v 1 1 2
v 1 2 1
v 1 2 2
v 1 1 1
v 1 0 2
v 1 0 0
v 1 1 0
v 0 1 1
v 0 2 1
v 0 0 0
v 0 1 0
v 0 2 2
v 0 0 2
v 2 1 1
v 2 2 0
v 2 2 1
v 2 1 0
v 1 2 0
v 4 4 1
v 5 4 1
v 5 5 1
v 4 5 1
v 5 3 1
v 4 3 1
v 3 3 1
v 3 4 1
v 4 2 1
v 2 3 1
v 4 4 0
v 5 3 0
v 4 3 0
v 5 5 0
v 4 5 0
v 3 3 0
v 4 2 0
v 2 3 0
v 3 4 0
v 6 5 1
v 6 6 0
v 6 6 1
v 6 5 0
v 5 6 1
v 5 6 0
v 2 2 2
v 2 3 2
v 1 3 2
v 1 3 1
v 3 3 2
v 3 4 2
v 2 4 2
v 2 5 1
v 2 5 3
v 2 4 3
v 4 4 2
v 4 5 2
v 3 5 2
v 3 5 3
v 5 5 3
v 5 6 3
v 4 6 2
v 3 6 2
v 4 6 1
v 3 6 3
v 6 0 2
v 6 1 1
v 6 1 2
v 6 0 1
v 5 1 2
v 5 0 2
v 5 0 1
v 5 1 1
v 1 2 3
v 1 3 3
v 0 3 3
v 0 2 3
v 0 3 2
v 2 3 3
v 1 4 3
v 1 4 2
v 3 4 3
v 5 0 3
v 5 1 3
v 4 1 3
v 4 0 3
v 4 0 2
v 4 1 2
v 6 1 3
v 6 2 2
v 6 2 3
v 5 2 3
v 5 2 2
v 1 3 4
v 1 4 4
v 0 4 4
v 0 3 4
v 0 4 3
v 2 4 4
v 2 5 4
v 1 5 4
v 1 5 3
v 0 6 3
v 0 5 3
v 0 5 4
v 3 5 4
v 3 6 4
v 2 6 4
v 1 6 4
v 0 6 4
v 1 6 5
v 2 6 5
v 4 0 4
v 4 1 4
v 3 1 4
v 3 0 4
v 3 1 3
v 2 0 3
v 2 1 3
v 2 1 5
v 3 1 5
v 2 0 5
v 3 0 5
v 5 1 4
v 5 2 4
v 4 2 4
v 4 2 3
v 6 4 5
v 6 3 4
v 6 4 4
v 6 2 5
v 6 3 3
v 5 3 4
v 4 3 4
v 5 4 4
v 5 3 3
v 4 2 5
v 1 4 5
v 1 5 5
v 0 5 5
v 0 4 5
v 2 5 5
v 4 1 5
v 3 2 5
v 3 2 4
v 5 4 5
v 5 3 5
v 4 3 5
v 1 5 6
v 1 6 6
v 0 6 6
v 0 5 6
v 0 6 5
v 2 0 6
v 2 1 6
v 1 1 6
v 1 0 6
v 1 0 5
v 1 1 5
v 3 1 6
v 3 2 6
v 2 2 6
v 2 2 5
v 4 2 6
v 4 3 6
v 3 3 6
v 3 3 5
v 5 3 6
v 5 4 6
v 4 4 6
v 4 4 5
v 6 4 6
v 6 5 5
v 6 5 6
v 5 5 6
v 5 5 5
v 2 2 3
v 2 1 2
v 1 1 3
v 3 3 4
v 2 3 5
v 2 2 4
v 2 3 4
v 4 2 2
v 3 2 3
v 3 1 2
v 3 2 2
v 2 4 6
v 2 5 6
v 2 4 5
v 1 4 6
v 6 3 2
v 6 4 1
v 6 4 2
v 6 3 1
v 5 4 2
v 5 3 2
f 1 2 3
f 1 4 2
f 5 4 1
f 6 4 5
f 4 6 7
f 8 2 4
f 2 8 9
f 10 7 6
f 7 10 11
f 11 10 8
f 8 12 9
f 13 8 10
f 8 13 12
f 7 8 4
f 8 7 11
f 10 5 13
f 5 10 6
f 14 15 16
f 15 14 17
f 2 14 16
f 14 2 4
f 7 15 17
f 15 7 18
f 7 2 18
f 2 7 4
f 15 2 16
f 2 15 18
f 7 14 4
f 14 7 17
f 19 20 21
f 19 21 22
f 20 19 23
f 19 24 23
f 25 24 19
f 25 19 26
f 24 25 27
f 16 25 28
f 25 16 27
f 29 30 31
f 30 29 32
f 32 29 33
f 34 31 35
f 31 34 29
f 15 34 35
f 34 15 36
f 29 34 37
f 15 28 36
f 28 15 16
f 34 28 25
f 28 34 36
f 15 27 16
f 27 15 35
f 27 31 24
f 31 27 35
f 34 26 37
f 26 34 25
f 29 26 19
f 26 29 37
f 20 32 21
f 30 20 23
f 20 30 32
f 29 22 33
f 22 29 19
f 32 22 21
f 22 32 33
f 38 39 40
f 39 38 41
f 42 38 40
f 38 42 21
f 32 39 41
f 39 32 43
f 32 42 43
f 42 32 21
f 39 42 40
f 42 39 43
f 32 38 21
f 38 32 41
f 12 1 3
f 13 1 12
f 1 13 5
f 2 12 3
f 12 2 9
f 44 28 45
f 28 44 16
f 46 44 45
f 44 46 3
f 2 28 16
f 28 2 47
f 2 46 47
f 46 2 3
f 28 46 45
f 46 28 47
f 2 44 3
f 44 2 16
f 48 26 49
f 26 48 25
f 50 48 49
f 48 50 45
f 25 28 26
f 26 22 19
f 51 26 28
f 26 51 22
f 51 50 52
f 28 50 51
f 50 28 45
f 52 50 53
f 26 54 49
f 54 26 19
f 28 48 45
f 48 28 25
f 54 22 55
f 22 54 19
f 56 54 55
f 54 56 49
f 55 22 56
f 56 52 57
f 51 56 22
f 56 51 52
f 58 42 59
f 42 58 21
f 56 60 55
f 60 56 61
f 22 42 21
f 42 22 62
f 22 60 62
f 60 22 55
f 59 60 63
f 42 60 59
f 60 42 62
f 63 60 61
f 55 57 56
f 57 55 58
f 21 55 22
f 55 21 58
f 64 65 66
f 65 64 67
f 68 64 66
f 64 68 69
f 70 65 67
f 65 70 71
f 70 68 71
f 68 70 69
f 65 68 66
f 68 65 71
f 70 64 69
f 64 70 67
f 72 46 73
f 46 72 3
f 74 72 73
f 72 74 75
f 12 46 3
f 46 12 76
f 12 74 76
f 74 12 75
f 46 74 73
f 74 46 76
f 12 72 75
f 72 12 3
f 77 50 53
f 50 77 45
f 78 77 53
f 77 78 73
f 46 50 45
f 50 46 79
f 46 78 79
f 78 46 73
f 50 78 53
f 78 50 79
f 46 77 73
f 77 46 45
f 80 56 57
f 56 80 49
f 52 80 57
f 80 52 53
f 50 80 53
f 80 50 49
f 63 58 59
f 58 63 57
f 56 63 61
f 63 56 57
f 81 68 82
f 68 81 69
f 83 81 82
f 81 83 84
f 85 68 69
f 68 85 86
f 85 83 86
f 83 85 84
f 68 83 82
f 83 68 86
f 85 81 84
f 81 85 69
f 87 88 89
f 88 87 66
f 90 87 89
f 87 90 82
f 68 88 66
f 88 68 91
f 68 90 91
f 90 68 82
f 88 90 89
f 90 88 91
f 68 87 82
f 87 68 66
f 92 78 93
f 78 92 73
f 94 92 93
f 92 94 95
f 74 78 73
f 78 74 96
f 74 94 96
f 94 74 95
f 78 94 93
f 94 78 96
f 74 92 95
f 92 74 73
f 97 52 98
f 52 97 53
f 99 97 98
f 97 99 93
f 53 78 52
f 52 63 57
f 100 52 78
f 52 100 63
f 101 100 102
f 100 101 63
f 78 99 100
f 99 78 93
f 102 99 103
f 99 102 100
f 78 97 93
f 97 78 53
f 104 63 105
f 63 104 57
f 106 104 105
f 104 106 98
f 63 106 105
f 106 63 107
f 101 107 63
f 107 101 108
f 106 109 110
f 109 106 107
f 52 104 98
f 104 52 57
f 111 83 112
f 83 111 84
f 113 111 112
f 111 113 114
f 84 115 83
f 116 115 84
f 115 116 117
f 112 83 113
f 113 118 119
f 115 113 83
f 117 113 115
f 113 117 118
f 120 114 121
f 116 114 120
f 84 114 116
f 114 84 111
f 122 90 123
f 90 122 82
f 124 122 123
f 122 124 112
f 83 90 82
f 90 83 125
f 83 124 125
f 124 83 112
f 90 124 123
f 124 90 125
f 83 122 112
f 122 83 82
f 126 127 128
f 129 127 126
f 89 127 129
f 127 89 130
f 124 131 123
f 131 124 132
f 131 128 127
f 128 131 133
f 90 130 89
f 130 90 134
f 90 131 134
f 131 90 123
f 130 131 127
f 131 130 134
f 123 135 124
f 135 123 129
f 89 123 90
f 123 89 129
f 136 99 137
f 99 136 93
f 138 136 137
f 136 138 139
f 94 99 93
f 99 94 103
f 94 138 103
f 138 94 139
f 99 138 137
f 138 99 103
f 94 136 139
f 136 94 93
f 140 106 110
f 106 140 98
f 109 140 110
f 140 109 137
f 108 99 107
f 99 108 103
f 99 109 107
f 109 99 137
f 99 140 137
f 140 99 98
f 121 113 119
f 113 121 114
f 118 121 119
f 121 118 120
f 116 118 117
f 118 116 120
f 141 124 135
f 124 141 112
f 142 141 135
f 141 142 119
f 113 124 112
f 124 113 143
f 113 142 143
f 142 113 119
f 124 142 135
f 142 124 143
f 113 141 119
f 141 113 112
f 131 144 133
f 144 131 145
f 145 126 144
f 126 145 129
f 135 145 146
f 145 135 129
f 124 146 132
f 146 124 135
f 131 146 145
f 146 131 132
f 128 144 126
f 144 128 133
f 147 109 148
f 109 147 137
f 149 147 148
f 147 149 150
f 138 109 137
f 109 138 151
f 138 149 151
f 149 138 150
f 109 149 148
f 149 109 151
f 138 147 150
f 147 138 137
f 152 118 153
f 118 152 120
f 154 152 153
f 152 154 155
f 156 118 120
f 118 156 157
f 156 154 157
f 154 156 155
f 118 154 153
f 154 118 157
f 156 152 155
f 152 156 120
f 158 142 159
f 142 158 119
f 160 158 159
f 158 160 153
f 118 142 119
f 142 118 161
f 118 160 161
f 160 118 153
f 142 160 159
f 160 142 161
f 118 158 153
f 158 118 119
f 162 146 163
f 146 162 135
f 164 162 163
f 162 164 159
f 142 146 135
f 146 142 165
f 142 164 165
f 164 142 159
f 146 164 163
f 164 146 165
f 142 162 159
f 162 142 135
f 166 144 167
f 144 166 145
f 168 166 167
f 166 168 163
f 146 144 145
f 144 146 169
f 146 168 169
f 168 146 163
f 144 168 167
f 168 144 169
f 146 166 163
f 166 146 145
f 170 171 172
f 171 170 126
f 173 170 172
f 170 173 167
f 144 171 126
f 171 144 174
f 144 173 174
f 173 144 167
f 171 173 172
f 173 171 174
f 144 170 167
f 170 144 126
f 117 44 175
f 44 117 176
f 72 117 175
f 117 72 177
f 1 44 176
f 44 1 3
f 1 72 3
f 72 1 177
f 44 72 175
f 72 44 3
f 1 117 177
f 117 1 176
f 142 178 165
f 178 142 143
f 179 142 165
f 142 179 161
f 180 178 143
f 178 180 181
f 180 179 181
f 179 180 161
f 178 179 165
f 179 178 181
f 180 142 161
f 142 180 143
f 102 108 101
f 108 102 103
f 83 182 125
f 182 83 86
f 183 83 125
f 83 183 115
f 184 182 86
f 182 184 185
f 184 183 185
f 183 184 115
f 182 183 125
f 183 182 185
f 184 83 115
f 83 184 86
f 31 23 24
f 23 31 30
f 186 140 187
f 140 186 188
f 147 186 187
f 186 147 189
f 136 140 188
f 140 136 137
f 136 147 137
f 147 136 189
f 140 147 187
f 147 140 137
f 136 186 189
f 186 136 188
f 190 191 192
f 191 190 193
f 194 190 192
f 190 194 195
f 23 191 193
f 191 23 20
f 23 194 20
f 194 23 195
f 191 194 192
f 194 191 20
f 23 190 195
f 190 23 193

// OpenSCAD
union() {
    translate([0, 0, 0]) cube([1, 1, 1]);
    translate([1, 1, 0]) cube([1, 1, 1]);
    translate([2, 2, 0]) cube([1, 1, 1]);
    translate([3, 3, 0]) cube([1, 1, 1]);
    translate([4, 4, 0]) cube([1, 1, 1]);
    translate([5, 5, 0]) cube([1, 1, 1]);
    translate([0, 1, 1]) cube([1, 1, 1]);
    translate([1, 2, 1]) cube([1, 1, 1]);
    translate([2, 3, 1]) cube([1, 1, 1]);
    translate([3, 4, 1]) cube([1, 1, 1]);
    translate([4, 5, 1]) cube([1, 1, 1]);
    translate([5, 0, 1]) cube([1, 1, 1]);
    translate([0, 2, 2]) cube([1, 1, 1]);
    translate([1, 3, 2]) cube([1, 1, 1]);
    translate([2, 4, 2]) cube([1, 1, 1]);
    translate([3, 5, 2]) cube([1, 1, 1]);
    translate([4, 0, 2]) cube([1, 1, 1]);
    translate([5, 1, 2]) cube([1, 1, 1]);
    translate([0, 3, 3]) cube([1, 1, 1]);
    translate([1, 4, 3]) cube([1, 1, 1]);
    translate([2, 5, 3]) cube([1, 1, 1]);
    translate([3, 0, 3]) cube([1, 1, 1]);
    translate([4, 1, 3]) cube([1, 1, 1]);
    translate([5, 2, 3]) cube([1, 1, 1]);
    translate([0, 4, 4]) cube([1, 1, 1]);
    translate([1, 5, 4]) cube([1, 1, 1]);
    translate([2, 0, 4]) cube([1, 1, 1]);
    translate([3, 1, 4]) cube([1, 1, 1]);
    translate([4, 2, 4]) cube([1, 1, 1]);
    translate([5, 3, 4]) cube([1, 1, 1]);
    translate([0, 5, 5]) cube([1, 1, 1]);
    translate([1, 0, 5]) cube([1, 1, 1]);
    translate([2, 1, 5]) cube([1, 1, 1]);
    translate([3, 2, 5]) cube([1, 1, 1]);
    translate([4, 3, 5]) cube([1, 1, 1]);
    translate([5, 4, 5]) cube([1, 1, 1]);
    translate([0, 0, 1]) cube([1, 1, 1]);
    translate([1, 1, 2]) cube([1, 1, 1]);
    translate([2, 2, 4]) cube([1, 1, 1]);
    translate([0, 5, 3]) cube([1, 1, 1]);
    translate([2, 4, 1]) cube([1, 1, 1]);
    translate([3, 1, 2]) cube([1, 1, 1]);
    translate([4, 3, 0]) cube([1, 1, 1]);
    translate([5, 2, 4]) cube([1, 1, 1]);
    translate([1, 4, 5]) cube([1, 1, 1]);
    translate([2, 0, 3]) cube([1, 1, 1]);
    translate([4, 5, 2]) cube([1, 1, 1]);
    translate([5, 3, 1]) cube([1, 1, 1]);
    translate([1, 5, 3]) cube([1, 1, 1]);
    translate([3, 2, 0]) cube([1, 1, 1]);
}
